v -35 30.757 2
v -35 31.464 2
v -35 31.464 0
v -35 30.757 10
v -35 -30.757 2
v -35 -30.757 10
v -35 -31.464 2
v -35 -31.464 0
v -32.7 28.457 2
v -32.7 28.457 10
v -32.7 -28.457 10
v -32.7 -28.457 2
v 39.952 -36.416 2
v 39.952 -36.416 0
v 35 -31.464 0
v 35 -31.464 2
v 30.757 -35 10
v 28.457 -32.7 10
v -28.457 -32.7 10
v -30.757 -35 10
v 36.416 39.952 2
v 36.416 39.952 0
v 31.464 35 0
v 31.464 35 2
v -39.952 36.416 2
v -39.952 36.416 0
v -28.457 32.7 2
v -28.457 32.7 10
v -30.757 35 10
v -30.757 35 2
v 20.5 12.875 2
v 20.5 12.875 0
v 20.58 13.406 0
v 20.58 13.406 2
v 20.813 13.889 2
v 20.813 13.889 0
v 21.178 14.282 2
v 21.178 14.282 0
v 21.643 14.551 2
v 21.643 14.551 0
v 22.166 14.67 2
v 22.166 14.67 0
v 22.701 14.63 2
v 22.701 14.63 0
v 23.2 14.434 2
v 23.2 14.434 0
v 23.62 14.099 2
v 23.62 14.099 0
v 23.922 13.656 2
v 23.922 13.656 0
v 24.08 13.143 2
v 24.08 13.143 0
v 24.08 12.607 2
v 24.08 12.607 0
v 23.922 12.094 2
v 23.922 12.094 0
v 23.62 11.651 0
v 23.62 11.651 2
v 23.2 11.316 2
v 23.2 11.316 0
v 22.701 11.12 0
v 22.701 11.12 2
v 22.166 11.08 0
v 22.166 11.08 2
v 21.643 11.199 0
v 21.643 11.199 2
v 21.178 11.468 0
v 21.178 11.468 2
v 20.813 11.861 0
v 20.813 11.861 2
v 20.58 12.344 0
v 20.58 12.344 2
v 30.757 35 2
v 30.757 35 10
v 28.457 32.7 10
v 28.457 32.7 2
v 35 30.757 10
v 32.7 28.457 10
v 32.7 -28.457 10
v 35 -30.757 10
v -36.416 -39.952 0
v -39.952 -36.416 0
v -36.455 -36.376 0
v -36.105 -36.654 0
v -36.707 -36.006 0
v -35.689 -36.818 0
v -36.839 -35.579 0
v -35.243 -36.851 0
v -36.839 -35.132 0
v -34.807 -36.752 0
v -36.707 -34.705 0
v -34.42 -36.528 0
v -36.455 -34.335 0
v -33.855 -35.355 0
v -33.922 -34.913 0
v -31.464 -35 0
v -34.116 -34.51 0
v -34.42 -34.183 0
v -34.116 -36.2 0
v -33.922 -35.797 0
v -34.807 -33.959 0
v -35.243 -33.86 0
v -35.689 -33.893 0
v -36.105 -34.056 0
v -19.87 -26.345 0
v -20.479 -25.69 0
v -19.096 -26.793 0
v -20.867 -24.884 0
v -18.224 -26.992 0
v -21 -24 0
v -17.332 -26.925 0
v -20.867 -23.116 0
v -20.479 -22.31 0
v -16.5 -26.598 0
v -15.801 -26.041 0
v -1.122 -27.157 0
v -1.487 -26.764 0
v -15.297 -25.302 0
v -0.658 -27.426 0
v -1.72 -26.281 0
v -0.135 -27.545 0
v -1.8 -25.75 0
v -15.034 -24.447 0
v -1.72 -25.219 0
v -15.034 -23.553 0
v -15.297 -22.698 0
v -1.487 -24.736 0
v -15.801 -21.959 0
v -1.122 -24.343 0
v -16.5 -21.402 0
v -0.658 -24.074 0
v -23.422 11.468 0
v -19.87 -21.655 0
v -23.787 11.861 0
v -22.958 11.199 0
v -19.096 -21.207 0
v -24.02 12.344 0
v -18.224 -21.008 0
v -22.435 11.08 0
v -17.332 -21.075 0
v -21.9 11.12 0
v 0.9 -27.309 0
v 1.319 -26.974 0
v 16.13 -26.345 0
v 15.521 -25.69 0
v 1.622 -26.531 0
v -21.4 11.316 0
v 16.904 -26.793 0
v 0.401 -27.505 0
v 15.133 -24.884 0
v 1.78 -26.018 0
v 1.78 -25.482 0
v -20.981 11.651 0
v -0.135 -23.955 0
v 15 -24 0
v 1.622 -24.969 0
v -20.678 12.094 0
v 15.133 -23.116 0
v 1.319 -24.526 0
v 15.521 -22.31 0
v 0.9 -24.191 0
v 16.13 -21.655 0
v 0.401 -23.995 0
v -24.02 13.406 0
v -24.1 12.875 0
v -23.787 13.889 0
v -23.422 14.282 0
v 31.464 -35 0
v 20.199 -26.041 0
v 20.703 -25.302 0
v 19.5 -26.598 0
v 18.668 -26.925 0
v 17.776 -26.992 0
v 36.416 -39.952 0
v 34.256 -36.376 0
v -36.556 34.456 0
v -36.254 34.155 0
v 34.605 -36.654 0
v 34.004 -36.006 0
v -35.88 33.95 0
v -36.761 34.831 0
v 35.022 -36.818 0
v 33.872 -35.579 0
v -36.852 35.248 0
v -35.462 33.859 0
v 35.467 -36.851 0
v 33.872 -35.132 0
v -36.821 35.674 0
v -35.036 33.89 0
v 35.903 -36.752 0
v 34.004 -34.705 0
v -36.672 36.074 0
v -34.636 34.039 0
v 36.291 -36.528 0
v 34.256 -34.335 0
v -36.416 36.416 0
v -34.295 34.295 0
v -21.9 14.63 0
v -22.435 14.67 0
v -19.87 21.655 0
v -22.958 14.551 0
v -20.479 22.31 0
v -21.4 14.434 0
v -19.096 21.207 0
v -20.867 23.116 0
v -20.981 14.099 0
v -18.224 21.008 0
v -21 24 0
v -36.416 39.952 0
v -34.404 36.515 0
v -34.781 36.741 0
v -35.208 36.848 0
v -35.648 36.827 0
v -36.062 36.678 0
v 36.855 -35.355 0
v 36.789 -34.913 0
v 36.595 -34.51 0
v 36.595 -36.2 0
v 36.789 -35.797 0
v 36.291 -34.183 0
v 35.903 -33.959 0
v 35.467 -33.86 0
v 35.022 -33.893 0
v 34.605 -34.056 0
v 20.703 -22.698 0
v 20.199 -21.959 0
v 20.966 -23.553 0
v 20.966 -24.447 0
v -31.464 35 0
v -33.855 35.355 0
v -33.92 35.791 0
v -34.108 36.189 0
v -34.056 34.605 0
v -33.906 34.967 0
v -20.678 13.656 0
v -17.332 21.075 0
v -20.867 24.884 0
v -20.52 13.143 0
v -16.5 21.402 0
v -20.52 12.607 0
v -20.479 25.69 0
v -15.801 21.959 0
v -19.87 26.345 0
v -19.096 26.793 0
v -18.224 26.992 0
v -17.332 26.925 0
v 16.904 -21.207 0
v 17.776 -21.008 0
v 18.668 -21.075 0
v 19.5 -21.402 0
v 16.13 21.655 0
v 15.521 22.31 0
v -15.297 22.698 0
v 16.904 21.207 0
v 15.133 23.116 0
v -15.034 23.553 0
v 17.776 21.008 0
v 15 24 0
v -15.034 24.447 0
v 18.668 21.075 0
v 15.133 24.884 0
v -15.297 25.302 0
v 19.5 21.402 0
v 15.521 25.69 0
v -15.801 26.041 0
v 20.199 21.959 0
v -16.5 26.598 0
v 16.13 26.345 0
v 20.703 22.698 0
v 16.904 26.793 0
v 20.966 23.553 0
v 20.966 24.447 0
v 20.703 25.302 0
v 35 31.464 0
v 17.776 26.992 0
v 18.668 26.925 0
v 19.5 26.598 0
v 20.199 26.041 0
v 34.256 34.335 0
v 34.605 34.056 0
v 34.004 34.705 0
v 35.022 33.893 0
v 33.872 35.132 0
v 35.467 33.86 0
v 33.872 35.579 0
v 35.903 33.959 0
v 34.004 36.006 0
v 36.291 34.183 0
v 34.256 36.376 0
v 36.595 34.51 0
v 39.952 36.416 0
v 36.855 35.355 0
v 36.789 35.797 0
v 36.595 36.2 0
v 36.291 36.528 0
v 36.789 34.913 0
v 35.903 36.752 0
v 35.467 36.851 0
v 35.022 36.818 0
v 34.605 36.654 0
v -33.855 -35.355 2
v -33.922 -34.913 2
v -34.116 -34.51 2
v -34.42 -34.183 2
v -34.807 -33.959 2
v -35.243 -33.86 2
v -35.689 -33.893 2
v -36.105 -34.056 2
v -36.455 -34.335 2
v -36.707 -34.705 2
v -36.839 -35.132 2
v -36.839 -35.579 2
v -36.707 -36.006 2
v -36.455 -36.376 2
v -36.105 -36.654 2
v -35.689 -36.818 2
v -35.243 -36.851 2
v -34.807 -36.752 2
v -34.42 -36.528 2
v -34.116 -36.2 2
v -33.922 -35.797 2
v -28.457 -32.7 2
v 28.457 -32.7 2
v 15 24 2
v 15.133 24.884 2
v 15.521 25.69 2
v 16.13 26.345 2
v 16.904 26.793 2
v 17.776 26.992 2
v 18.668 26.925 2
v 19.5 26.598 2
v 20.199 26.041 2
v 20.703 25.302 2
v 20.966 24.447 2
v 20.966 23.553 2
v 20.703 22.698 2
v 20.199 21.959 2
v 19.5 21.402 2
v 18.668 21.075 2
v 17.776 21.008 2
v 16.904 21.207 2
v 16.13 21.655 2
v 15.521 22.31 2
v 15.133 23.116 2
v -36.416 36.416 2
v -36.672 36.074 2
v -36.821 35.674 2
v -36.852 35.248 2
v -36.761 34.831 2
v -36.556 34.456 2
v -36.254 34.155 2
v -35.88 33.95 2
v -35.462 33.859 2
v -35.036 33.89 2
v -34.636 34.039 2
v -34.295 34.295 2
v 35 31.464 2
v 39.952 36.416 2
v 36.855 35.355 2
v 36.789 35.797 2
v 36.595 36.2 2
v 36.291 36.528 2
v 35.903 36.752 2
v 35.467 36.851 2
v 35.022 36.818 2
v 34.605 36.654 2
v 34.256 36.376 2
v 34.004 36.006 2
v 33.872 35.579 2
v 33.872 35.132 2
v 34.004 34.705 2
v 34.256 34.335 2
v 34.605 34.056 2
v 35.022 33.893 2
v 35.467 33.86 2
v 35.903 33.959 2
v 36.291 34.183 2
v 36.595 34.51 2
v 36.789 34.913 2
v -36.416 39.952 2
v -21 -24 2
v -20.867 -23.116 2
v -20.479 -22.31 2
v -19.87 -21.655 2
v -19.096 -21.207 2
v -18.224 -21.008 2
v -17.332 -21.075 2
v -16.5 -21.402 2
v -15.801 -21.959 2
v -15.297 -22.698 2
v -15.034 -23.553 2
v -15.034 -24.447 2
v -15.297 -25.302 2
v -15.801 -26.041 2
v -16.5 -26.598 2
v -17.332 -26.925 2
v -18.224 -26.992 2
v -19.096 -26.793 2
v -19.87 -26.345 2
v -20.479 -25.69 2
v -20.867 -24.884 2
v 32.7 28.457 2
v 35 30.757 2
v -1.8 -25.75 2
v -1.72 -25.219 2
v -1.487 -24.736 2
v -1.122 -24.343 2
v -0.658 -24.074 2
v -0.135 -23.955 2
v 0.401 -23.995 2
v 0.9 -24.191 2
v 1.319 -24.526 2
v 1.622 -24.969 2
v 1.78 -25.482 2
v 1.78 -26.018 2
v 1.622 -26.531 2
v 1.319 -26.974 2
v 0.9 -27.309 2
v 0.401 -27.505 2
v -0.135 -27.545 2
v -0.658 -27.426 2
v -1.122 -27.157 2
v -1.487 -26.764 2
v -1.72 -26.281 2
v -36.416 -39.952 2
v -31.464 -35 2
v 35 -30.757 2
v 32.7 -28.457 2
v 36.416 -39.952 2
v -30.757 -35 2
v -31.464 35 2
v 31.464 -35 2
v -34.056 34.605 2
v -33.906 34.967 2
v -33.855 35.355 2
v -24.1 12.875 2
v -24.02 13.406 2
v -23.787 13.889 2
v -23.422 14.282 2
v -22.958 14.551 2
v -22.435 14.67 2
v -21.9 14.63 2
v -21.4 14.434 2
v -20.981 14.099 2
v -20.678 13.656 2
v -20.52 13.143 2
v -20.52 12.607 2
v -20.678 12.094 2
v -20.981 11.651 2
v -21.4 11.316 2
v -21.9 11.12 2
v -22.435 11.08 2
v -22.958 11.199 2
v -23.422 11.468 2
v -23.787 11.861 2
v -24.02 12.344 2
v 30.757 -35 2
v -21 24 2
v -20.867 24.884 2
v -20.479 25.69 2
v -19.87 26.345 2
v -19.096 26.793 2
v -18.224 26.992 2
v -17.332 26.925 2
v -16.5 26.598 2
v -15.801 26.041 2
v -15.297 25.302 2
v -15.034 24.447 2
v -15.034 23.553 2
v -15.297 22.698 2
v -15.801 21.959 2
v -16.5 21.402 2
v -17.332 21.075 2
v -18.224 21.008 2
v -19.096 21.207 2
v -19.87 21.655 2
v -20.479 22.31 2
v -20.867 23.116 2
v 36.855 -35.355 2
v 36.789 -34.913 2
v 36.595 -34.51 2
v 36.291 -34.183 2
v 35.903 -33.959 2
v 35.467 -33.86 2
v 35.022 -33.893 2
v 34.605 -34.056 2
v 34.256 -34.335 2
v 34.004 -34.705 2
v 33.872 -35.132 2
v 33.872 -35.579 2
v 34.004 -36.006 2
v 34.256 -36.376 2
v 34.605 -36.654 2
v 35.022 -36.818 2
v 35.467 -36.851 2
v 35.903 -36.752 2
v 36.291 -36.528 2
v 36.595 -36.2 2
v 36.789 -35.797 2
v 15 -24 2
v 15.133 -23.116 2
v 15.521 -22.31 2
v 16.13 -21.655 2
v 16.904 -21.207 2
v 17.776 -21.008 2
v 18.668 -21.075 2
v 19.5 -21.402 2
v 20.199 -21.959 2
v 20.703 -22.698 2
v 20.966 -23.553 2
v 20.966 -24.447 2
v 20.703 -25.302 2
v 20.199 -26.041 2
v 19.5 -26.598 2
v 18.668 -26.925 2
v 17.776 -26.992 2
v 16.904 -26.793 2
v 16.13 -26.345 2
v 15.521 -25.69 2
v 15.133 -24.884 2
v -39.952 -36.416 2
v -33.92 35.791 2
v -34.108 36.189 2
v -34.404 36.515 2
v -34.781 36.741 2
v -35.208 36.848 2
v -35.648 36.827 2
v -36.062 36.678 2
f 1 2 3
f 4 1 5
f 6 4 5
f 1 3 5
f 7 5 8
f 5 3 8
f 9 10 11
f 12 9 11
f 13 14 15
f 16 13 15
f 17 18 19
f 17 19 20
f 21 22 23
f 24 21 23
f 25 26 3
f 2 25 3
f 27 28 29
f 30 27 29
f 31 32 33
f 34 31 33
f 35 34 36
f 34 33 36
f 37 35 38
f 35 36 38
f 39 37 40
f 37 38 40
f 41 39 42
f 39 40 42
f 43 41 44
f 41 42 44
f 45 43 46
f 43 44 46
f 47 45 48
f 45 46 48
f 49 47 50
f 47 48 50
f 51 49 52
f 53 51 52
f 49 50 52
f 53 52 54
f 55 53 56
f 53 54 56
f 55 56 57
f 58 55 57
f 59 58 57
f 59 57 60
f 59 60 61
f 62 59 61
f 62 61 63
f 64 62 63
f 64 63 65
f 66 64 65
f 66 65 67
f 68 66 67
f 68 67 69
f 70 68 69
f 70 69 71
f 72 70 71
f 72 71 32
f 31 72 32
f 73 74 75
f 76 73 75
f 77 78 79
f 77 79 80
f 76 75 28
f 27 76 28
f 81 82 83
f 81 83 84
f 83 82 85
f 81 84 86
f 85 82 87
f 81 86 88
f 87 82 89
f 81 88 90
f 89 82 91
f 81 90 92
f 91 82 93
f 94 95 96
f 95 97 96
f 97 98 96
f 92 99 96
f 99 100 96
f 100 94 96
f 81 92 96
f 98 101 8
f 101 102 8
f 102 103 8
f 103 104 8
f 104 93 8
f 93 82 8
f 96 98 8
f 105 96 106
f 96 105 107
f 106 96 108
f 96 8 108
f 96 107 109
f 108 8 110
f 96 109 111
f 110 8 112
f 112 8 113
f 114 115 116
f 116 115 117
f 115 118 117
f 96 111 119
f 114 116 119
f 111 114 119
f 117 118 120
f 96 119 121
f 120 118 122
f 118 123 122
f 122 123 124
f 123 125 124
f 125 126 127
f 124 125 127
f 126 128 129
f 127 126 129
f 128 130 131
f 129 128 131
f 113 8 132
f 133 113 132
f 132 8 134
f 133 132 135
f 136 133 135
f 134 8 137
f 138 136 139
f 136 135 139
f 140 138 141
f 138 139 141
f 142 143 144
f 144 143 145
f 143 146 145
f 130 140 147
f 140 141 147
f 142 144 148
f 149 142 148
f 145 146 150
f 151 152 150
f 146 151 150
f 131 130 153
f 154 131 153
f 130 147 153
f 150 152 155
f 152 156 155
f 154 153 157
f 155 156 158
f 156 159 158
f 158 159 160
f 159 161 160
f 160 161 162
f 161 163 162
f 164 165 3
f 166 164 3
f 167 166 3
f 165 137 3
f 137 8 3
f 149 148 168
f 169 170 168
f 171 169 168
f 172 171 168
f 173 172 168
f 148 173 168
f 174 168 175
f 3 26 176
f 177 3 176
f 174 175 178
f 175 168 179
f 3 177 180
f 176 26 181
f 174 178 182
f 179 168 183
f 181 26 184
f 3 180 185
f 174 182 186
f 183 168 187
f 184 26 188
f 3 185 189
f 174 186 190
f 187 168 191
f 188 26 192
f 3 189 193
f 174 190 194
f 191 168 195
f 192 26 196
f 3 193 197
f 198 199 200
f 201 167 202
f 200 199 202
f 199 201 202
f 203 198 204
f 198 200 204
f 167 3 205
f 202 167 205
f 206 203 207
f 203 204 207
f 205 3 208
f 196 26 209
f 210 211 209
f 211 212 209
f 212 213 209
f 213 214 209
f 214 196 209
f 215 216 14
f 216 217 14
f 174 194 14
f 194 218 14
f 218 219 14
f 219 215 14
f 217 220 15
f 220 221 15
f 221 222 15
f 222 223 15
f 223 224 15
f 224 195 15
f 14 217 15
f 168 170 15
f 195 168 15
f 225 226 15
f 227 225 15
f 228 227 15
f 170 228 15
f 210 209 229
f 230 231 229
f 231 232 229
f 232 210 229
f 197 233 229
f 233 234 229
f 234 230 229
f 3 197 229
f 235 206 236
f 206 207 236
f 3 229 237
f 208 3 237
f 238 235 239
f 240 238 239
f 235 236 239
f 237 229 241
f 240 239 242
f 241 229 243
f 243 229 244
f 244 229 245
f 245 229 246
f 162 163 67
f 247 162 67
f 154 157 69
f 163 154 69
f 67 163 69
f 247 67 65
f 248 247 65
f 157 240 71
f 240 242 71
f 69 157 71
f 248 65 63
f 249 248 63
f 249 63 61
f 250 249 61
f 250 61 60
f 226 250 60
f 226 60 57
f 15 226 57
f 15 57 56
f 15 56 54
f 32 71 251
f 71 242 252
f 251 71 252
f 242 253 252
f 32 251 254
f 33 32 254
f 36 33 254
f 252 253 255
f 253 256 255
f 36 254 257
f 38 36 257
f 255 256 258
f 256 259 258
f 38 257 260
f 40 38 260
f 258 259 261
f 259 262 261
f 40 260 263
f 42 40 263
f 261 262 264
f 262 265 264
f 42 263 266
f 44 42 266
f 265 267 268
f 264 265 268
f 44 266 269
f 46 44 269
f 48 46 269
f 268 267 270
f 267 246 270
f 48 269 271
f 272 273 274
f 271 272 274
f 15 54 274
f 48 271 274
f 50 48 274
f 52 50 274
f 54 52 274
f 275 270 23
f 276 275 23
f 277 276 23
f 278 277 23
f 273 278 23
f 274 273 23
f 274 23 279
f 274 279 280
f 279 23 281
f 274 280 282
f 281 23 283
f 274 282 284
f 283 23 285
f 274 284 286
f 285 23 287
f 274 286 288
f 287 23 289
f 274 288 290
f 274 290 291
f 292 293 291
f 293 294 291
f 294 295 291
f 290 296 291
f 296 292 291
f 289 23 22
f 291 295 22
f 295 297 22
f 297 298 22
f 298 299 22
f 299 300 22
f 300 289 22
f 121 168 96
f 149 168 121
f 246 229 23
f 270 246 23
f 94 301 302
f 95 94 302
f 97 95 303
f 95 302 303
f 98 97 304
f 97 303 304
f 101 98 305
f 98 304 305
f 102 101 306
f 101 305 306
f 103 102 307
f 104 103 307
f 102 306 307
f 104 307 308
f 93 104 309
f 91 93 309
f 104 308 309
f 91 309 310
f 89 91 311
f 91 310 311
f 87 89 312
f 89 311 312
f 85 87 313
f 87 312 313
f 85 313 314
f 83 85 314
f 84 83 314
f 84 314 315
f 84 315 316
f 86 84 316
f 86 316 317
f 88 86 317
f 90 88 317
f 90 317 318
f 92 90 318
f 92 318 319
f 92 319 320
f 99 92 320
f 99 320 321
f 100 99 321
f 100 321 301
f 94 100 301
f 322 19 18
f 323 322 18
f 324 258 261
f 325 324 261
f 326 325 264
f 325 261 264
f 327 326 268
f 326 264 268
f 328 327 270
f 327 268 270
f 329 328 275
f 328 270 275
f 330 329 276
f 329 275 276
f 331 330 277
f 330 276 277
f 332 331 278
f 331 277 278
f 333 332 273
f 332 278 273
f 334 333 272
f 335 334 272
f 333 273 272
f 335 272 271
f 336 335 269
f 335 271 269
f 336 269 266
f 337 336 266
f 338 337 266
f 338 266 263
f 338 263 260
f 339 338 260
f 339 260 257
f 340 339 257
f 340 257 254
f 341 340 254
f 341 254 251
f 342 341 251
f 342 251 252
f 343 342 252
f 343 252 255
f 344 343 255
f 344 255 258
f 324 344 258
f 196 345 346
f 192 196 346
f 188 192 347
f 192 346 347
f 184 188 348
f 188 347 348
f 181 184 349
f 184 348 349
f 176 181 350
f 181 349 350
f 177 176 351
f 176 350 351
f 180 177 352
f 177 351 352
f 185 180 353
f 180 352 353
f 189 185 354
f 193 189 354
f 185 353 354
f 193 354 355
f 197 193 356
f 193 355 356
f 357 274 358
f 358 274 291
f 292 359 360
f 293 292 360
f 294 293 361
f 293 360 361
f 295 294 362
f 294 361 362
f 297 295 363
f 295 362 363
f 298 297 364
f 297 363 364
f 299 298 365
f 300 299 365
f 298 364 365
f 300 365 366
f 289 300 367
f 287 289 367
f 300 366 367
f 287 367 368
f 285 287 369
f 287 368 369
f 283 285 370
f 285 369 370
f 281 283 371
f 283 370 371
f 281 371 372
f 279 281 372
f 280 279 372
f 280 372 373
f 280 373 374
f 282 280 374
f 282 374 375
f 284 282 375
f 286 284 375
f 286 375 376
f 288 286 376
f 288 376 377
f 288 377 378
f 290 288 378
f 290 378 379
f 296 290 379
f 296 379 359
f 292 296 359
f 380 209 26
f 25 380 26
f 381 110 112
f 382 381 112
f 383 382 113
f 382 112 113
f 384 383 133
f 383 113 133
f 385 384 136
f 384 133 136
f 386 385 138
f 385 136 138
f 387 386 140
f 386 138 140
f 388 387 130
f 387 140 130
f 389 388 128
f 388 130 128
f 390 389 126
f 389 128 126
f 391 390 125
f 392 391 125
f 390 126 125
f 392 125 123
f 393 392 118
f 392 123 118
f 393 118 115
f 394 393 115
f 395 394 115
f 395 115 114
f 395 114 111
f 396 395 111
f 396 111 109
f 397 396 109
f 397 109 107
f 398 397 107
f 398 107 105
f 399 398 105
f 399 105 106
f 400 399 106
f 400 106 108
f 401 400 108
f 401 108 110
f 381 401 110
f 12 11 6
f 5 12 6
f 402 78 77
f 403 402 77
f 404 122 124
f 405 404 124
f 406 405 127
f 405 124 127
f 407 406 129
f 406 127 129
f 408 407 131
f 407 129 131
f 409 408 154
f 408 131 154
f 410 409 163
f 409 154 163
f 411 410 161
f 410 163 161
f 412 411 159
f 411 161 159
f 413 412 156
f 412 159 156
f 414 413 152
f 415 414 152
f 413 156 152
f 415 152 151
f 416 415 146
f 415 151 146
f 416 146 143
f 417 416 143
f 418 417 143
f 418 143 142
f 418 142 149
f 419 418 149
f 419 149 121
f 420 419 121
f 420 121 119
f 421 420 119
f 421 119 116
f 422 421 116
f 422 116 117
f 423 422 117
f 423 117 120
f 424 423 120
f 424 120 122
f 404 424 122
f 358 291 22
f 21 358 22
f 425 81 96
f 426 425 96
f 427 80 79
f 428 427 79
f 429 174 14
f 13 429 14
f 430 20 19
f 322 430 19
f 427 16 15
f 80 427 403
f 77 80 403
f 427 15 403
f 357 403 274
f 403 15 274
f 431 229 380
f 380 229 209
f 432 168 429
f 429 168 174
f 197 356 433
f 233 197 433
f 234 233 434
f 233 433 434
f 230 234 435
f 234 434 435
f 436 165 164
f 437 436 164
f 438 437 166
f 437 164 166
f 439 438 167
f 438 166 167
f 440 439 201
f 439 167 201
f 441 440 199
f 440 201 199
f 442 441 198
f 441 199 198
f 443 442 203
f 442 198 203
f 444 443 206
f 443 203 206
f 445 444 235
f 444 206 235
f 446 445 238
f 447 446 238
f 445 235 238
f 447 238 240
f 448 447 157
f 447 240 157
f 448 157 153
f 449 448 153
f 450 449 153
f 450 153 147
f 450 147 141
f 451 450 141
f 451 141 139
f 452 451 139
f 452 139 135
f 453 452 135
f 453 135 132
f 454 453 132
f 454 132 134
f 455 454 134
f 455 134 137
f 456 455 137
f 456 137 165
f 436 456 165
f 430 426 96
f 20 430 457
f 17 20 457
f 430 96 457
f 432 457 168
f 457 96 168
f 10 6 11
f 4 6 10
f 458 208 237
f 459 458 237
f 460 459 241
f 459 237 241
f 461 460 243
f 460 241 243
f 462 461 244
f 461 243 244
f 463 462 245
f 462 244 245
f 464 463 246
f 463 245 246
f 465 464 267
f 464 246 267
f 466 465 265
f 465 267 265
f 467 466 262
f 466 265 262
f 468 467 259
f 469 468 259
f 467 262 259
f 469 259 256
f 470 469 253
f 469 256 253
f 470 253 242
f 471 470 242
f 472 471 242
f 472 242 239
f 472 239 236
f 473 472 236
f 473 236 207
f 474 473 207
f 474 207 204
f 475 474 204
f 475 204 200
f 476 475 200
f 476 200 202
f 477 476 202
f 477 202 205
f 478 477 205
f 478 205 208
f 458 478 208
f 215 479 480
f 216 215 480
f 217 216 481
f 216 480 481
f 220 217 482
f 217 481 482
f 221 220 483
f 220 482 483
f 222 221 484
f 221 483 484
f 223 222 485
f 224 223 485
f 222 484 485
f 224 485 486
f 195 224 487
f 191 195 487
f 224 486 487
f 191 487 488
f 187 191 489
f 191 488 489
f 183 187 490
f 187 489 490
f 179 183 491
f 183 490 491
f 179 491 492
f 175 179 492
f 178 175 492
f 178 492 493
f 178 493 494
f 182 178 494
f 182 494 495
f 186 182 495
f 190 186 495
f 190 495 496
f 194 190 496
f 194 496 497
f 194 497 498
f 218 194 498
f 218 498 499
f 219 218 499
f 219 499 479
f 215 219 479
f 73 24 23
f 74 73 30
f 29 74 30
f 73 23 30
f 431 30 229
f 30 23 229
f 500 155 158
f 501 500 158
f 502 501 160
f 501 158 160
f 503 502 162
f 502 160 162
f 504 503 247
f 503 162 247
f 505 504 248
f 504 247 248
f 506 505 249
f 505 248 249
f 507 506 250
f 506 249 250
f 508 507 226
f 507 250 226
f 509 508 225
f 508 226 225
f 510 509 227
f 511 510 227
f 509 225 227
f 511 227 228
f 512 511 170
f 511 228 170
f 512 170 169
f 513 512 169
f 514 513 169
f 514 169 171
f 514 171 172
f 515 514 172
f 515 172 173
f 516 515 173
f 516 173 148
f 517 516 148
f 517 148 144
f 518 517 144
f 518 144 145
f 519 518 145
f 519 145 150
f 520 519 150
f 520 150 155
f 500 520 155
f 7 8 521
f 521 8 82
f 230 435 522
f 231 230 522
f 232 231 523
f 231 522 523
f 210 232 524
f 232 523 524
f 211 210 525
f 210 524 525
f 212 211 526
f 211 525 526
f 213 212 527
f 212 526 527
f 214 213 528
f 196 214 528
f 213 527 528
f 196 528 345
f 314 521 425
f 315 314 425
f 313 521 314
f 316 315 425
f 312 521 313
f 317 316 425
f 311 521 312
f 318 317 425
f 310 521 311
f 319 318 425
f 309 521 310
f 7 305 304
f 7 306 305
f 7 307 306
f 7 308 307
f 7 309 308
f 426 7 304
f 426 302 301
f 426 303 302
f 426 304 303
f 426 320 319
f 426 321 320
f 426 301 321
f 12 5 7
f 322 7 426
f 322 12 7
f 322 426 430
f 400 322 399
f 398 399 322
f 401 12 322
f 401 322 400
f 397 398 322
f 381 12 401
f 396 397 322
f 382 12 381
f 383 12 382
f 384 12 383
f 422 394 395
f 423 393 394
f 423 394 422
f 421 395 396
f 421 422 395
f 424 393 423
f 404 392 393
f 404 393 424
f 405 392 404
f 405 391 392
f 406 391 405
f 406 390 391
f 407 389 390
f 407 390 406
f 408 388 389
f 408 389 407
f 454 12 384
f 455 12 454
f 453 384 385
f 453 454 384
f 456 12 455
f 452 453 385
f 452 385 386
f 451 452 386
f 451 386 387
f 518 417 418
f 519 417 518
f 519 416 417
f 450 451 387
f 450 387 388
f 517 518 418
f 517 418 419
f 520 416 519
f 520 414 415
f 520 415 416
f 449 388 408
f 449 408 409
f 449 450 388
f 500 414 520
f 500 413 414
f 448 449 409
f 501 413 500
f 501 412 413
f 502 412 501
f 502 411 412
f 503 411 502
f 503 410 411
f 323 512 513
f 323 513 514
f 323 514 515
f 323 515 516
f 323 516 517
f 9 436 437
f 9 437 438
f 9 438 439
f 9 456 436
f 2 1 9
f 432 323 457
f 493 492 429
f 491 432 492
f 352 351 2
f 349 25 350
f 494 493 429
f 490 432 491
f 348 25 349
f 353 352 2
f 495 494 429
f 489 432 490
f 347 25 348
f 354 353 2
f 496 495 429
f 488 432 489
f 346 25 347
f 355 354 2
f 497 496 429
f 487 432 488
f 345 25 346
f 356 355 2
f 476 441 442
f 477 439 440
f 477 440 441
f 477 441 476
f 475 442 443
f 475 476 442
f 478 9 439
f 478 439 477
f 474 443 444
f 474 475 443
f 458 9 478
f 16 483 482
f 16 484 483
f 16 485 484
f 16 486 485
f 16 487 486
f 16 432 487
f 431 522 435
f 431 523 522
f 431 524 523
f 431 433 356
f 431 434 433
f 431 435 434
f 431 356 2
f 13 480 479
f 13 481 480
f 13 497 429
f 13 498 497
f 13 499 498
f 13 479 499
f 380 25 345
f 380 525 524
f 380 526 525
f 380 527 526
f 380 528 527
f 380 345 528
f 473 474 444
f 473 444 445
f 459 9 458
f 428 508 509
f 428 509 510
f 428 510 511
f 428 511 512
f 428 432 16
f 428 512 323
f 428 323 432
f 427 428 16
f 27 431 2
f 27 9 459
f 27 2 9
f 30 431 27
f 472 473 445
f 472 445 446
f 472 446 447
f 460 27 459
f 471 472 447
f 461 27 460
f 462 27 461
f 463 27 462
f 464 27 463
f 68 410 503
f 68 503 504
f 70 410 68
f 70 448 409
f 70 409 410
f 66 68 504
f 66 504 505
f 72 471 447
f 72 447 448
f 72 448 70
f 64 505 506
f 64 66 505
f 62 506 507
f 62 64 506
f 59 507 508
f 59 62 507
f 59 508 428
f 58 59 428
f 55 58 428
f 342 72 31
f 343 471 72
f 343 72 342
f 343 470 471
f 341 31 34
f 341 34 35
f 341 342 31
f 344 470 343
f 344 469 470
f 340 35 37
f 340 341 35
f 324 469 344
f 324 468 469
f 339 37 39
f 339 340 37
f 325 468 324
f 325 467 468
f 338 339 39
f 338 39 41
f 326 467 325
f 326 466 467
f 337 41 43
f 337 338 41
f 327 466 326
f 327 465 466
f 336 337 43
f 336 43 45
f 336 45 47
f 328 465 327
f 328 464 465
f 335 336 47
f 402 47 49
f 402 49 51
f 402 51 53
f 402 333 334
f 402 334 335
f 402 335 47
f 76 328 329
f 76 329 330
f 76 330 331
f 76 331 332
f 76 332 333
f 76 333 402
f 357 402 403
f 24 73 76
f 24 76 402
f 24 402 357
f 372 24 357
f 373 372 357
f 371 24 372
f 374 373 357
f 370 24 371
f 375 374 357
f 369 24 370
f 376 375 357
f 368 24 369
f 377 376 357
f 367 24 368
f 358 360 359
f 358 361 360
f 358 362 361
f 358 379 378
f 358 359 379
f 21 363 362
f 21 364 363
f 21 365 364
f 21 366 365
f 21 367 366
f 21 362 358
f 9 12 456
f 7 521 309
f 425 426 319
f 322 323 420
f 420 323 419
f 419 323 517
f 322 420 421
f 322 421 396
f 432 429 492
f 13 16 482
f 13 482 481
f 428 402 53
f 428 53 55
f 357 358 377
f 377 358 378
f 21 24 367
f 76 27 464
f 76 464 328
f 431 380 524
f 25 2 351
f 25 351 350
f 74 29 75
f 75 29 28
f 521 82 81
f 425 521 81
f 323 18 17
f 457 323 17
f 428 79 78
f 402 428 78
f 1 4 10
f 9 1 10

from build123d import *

# Parameters (mm, degrees)
EXTRUDE_1_DEPTH     = 10
CUT_EXTRUDE_1_DEPTH = 8
CUT_EXTRUDE_2_REACH = 52.498
SKETCH_3_R          = 1.8
SKETCH_4_R          = 3
CUT_EXTRUDE_3_DEPTH = 51.497524692
EXTRUDE_START       = -10
EXTRUDE_2_DEPTH     = 10
CUT_EXTRUDE_4_DEPTH = 8
CUT_EXTRUDE_5_REACH = 59.064
SKETCH_7_R          = 1.5


with BuildPart() as part:
    # 草图1 → 凸台-拉伸1 (new body)
    with BuildSketch(Plane.XY):
        with BuildLine():
            Line((-33, -35), (33, -35))
            ThreePointArc((33, -35), (34.414213562, -34.414213562), (35, -33))
            Line((35, -33), (35, 33))
            ThreePointArc((35, 33), (34.414213562, 34.414213562), (33, 35))
            Line((33, 35), (-33, 35))
            ThreePointArc((-33, 35), (-34.414213562, 34.414213562), (-35, 33))
            Line((-35, 33), (-35, -33))
            ThreePointArc((-35, -33), (-34.414213562, -34.414213562), (-33, -35))
        make_face()
    extrude(amount=EXTRUDE_1_DEPTH)

    # 草图2 → 切除-拉伸1 (cut)
    with BuildSketch(Plane.XY.offset(10)):
        with BuildLine():
            Line((-29.7, -32.7), (29.7, -32.7))
            ThreePointArc((29.7, -32.7), (31.821320344, -31.821320344), (32.7, -29.7))
            Line((32.7, -29.7), (32.7, 29.7))
            ThreePointArc((32.7, 29.7), (31.821320344, 31.821320344), (29.7, 32.7))
            Line((29.7, 32.7), (-29.7, 32.7))
            ThreePointArc((-29.7, 32.7), (-31.821320344, 31.821320344), (-32.7, 29.7))
            Line((-32.7, 29.7), (-32.7, -29.7))
            ThreePointArc((-32.7, -29.7), (-31.821320344, -31.821320344), (-29.7, -32.7))
        make_face()
    extrude(amount=-CUT_EXTRUDE_1_DEPTH, mode=Mode.SUBTRACT)

    # 草图3 → 切除-拉伸2 (cut, up to next)
    with BuildSketch(Plane(origin=(0, 0, 0), x_dir=(-1, 0, 0), z_dir=(0, 0, -1)), mode=Mode.PRIVATE) as cut_extrude_2_sk1:
        with Locations((-22.300154147, 12.875)):
            Circle(SKETCH_3_R)
    cut_extrude_2_tool1 = extrude(cut_extrude_2_sk1.sketch, amount=-CUT_EXTRUDE_2_REACH, mode=Mode.PRIVATE) & part.part
    # 草图3 → 切除-拉伸2 (cut, up to next)
    with BuildSketch(Plane(origin=(0, 0, 0), x_dir=(-1, 0, 0), z_dir=(0, 0, -1)), mode=Mode.PRIVATE) as cut_extrude_2_sk2:
        with Locations((22.300154147, 12.875)):
            Circle(SKETCH_3_R)
    cut_extrude_2_tool2 = extrude(cut_extrude_2_sk2.sketch, amount=-CUT_EXTRUDE_2_REACH, mode=Mode.PRIVATE) & part.part
    # 草图3 → 切除-拉伸2 (cut, up to next)
    with BuildSketch(Plane(origin=(0, 0, 0), x_dir=(-1, 0, 0), z_dir=(0, 0, -1)), mode=Mode.PRIVATE) as cut_extrude_2_sk3:
        with Locations((0, -25.75)):
            Circle(SKETCH_3_R)
    cut_extrude_2_tool3 = extrude(cut_extrude_2_sk3.sketch, amount=-CUT_EXTRUDE_2_REACH, mode=Mode.PRIVATE) & part.part
    add(cut_extrude_2_tool1.solids().sort_by_distance((22.300154, 12.875, 0))[0], mode=Mode.SUBTRACT)
    add(cut_extrude_2_tool2.solids().sort_by_distance((-22.300154, 12.875, 0))[0], mode=Mode.SUBTRACT)
    add(cut_extrude_2_tool3.solids().sort_by_distance((0, -25.75, 0))[0], mode=Mode.SUBTRACT)

    # 草图4 → 切除-拉伸3 (cut, through all)
    with BuildSketch(Plane(origin=(0, 0, 0), x_dir=(-1, 0, 0), z_dir=(0, 0, -1))):
        with Locations((-18, 24)):
            Circle(SKETCH_4_R)
        with Locations((18, 24)):
            Circle(SKETCH_4_R)
        with Locations((-18, -24)):
            Circle(SKETCH_4_R)
        with Locations((18, -24)):
            Circle(SKETCH_4_R)
    extrude(amount=-CUT_EXTRUDE_3_DEPTH, mode=Mode.SUBTRACT)

    # 草图5 → 凸台-拉伸2 (add)
    with BuildSketch(Plane.XY.offset(10).offset(EXTRUDE_START)):
        with BuildLine():
            Line((-29.164466094, 32.7), (-31.464466094, 35))
            Line((-31.464466094, 35), (-33, 35))
            ThreePointArc((-33, 35), (-34.414213562, 34.414213562), (-35, 33))
            Line((-35, 33), (-35, 31.464466094))
            Line((-35, 31.464466094), (-32.7, 29.164466094))
            Line((-32.7, 29.164466094), (-32.7, 29.7))
            ThreePointArc((-32.7, 29.7), (-31.821320344, 31.821320344), (-29.7, 32.7))
            Line((-29.7, 32.7), (-29.164466094, 32.7))
        make_face()
        with BuildLine():
            Line((-33, 35), (-31.464466094, 35))
            Line((-31.464466094, 35), (-32.646446609, 36.181980515))
            Line((-32.646446609, 36.181980515), (-36.415999231, 39.951533137))
            Line((-36.415999231, 39.951533137), (-39.951533137, 36.415999231))
            Line((-39.951533137, 36.415999231), (-36.181980515, 32.646446609))
            Line((-36.181980515, 32.646446609), (-35, 31.464466094))
            Line((-35, 31.464466094), (-35, 33))
            ThreePointArc((-35, 33), (-34.414213562, 34.414213562), (-33, 35))
        make_face()
        with BuildLine():
            ThreePointArc((35, 33), (34.414213562, 34.414213562), (33, 35))
            Line((33, 35), (31.464466094, 35))
            Line((31.464466094, 35), (29.164466094, 32.7))
            Line((29.164466094, 32.7), (29.7, 32.7))
            ThreePointArc((29.7, 32.7), (31.821320344, 31.821320344), (32.7, 29.7))
            Line((32.7, 29.7), (32.7, 29.164466094))
            Line((32.7, 29.164466094), (35, 31.464466094))
            Line((35, 31.464466094), (35, 33))
        make_face()
        with BuildLine():
            Line((31.464466094, 35), (33, 35))
            ThreePointArc((33, 35), (34.414213562, 34.414213562), (35, 33))
            Line((35, 33), (35, 31.464466094))
            Line((35, 31.464466094), (36.181980515, 32.646446609))
            Line((36.181980515, 32.646446609), (39.951533137, 36.415999231))
            Line((39.951533137, 36.415999231), (36.415999231, 39.951533137))
            Line((36.415999231, 39.951533137), (32.646446609, 36.181980515))
            Line((32.646446609, 36.181980515), (31.464466094, 35))
        make_face()
        with BuildLine():
            Line((36.181980515, -32.646446609), (35, -31.464466094))
            Line((35, -31.464466094), (35, -33))
            ThreePointArc((35, -33), (34.414213562, -34.414213562), (33, -35))
            Line((33, -35), (31.464466094, -35))
            Line((31.464466094, -35), (32.646446609, -36.181980515))
            Line((32.646446609, -36.181980515), (36.415999231, -39.951533137))
            Line((36.415999231, -39.951533137), (39.951533137, -36.415999231))
            Line((39.951533137, -36.415999231), (36.181980515, -32.646446609))
        make_face()
        with BuildLine():
            Line((35, -33), (35, -31.464466094))
            Line((35, -31.464466094), (32.7, -29.164466094))
            Line((32.7, -29.164466094), (32.7, -29.7))
            ThreePointArc((32.7, -29.7), (31.821320344, -31.821320344), (29.7, -32.7))
            Line((29.7, -32.7), (29.164466094, -32.7))
            Line((29.164466094, -32.7), (31.464466094, -35))
            Line((31.464466094, -35), (33, -35))
            ThreePointArc((33, -35), (34.414213562, -34.414213562), (35, -33))
        make_face()
        with BuildLine():
            Line((-35, -33), (-35, -31.464466094))
            Line((-35, -31.464466094), (-36.181980515, -32.646446609))
            Line((-36.181980515, -32.646446609), (-39.951533137, -36.415999231))
            Line((-39.951533137, -36.415999231), (-36.415999231, -39.951533137))
            Line((-36.415999231, -39.951533137), (-32.646446609, -36.181980515))
            Line((-32.646446609, -36.181980515), (-31.464466094, -35))
            Line((-31.464466094, -35), (-33, -35))
            ThreePointArc((-33, -35), (-34.414213562, -34.414213562), (-35, -33))
        make_face()
        with BuildLine():
            Line((-32.7, -29.164466094), (-35, -31.464466094))
            Line((-35, -31.464466094), (-35, -33))
            ThreePointArc((-35, -33), (-34.414213562, -34.414213562), (-33, -35))
            Line((-33, -35), (-31.464466094, -35))
            Line((-31.464466094, -35), (-29.164466094, -32.7))
            Line((-29.164466094, -32.7), (-29.7, -32.7))
            ThreePointArc((-29.7, -32.7), (-31.821320344, -31.821320344), (-32.7, -29.7))
            Line((-32.7, -29.7), (-32.7, -29.164466094))
        make_face()
    extrude(amount=EXTRUDE_2_DEPTH)

    # 草图6 → 切除-拉伸4 (cut)
    with BuildSketch(Plane.XY.offset(10)):
        with BuildLine():
            Line((-30.757359313, -35), (-28.457359313, -32.7))
            Line((-28.457359313, -32.7), (-29.7, -32.7))
            ThreePointArc((-29.7, -32.7), (-31.821320344, -31.821320344), (-32.7, -29.7))
            Line((-32.7, -29.7), (-32.7, -28.457359313))
            Line((-32.7, -28.457359313), (-35, -30.757359313))
            Line((-35, -30.757359313), (-35, -31.464466094))
            Line((-35, -31.464466094), (-39.951533137, -36.415999231))
            Line((-39.951533137, -36.415999231), (-36.415999231, -39.951533137))
            Line((-36.415999231, -39.951533137), (-31.464466094, -35))
            Line((-31.464466094, -35), (-30.757359313, -35))
        make_face()
        with BuildLine():
            Line((-28.457359313, -32.7), (-28.257359313, -32.5))
            Line((-28.257359313, -32.5), (-27.64321207, -31.885852757))
            Line((-27.64321207, -31.885852757), (-31.885852757, -27.64321207))
            Line((-31.885852757, -27.64321207), (-32.5, -28.257359313))
            Line((-32.5, -28.257359313), (-32.7, -28.457359313))
            Line((-32.7, -28.457359313), (-32.7, -29.7))
            ThreePointArc((-32.7, -29.7), (-31.821320344, -31.821320344), (-29.7, -32.7))
            Line((-29.7, -32.7), (-28.457359313, -32.7))
        make_face()
        with BuildLine():
            Line((29.7, -32.7), (28.457359313, -32.7))
            Line((28.457359313, -32.7), (30.757359313, -35))
            Line((30.757359313, -35), (31.464466094, -35))
            Line((31.464466094, -35), (36.415999231, -39.951533137))
            Line((36.415999231, -39.951533137), (39.951533137, -36.415999231))
            Line((39.951533137, -36.415999231), (35, -31.464466094))
            Line((35, -31.464466094), (35, -30.757359313))
            Line((35, -30.757359313), (32.7, -28.457359313))
            Line((32.7, -28.457359313), (32.7, -29.7))
            ThreePointArc((32.7, -29.7), (31.821320344, -31.821320344), (29.7, -32.7))
        make_face()
        with BuildLine():
            Line((27.64321207, -31.885852757), (28.257359313, -32.5))
            Line((28.257359313, -32.5), (28.457359313, -32.7))
            Line((28.457359313, -32.7), (29.7, -32.7))
            ThreePointArc((29.7, -32.7), (31.821320344, -31.821320344), (32.7, -29.7))
            Line((32.7, -29.7), (32.7, -28.457359313))
            Line((32.7, -28.457359313), (32.5, -28.257359313))
            Line((32.5, -28.257359313), (31.885852757, -27.64321207))
            Line((31.885852757, -27.64321207), (27.64321207, -31.885852757))
        make_face()
        with BuildLine():
            Line((32.7, 29.7), (32.7, 28.457359313))
            Line((32.7, 28.457359313), (35, 30.757359313))
            Line((35, 30.757359313), (35, 31.464466094))
            Line((35, 31.464466094), (39.951533137, 36.415999231))
            Line((39.951533137, 36.415999231), (36.415999231, 39.951533137))
            Line((36.415999231, 39.951533137), (31.464466094, 35))
            Line((31.464466094, 35), (30.757359313, 35))
            Line((30.757359313, 35), (28.457359313, 32.7))
            Line((28.457359313, 32.7), (29.7, 32.7))
            ThreePointArc((29.7, 32.7), (31.821320344, 31.821320344), (32.7, 29.7))
        make_face()
        with BuildLine():
            Line((31.885852757, 27.64321207), (32.5, 28.257359313))
            Line((32.5, 28.257359313), (32.7, 28.457359313))
            Line((32.7, 28.457359313), (32.7, 29.7))
            ThreePointArc((32.7, 29.7), (31.821320344, 31.821320344), (29.7, 32.7))
            Line((29.7, 32.7), (28.457359313, 32.7))
            Line((28.457359313, 32.7), (28.257359313, 32.5))
            Line((28.257359313, 32.5), (27.64321207, 31.885852757))
            Line((27.64321207, 31.885852757), (31.885852757, 27.64321207))
        make_face()
        with BuildLine():
            Line((-32.7, 28.457359313), (-32.5, 28.257359313))
            Line((-32.5, 28.257359313), (-31.885852757, 27.64321207))
            Line((-31.885852757, 27.64321207), (-27.64321207, 31.885852757))
            Line((-27.64321207, 31.885852757), (-28.257359313, 32.5))
            Line((-28.257359313, 32.5), (-28.457359313, 32.7))
            Line((-28.457359313, 32.7), (-29.7, 32.7))
            ThreePointArc((-29.7, 32.7), (-31.821320344, 31.821320344), (-32.7, 29.7))
            Line((-32.7, 29.7), (-32.7, 28.457359313))
        make_face()
        with BuildLine():
            Line((-35, 30.757359313), (-32.7, 28.457359313))
            Line((-32.7, 28.457359313), (-32.7, 29.7))
            ThreePointArc((-32.7, 29.7), (-31.821320344, 31.821320344), (-29.7, 32.7))
            Line((-29.7, 32.7), (-28.457359313, 32.7))
            Line((-28.457359313, 32.7), (-30.757359313, 35))
            Line((-30.757359313, 35), (-31.464466094, 35))
            Line((-31.464466094, 35), (-36.415999231, 39.951533137))
            Line((-36.415999231, 39.951533137), (-39.951533137, 36.415999231))
            Line((-39.951533137, 36.415999231), (-35, 31.464466094))
            Line((-35, 31.464466094), (-35, 30.757359313))
        make_face()
    extrude(amount=-CUT_EXTRUDE_4_DEPTH, mode=Mode.SUBTRACT)

    # 草图7 → 切除-拉伸5 (cut, up to next)
    with BuildSketch(Plane.XY.offset(2), mode=Mode.PRIVATE) as cut_extrude_5_sk1:
        with BuildLine():
            ThreePointArc((-36.415999231, 36.415999231), (-36.415999231, 34.294678888), (-34.294678888, 34.294678888))
            Line((-34.294678888, 34.294678888), (-36.415999231, 36.415999231))
        make_face()
    cut_extrude_5_tool1 = extrude(cut_extrude_5_sk1.sketch, amount=-CUT_EXTRUDE_5_REACH, mode=Mode.PRIVATE) & part.part
    # 草图7 → 切除-拉伸5 (cut, up to next)
    with BuildSketch(Plane.XY.offset(2), mode=Mode.PRIVATE) as cut_extrude_5_sk2:
        with BuildLine():
            Line((-36.415999231, 36.415999231), (-34.294678888, 34.294678888))
            ThreePointArc((-34.294678888, 34.294678888), (-33.969519761, 34.781313911), (-33.855339059, 35.355339059))
            ThreePointArc((-33.855339059, 35.355339059), (-34.781313911, 36.741158358), (-36.415999231, 36.415999231))
        make_face()
    cut_extrude_5_tool2 = extrude(cut_extrude_5_sk2.sketch, amount=-CUT_EXTRUDE_5_REACH, mode=Mode.PRIVATE) & part.part
    # 草图7 → 切除-拉伸5 (cut, up to next)
    with BuildSketch(Plane.XY.offset(2), mode=Mode.PRIVATE) as cut_extrude_5_sk3:
        with BuildLine():
            ThreePointArc((-36.415999231, 36.415999231), (-36.415999231, 34.294678888), (-34.294678888, 34.294678888))
            Line((-34.294678888, 34.294678888), (-36.415999231, 36.415999231))
        make_face()
    cut_extrude_5_tool3 = extrude(cut_extrude_5_sk3.sketch, amount=-CUT_EXTRUDE_5_REACH, mode=Mode.PRIVATE) & part.part
    # 草图7 → 切除-拉伸5 (cut, up to next)
    with BuildSketch(Plane.XY.offset(2), mode=Mode.PRIVATE) as cut_extrude_5_sk4:
        with BuildLine():
            Line((-36.415999231, 36.415999231), (-34.294678888, 34.294678888))
            ThreePointArc((-34.294678888, 34.294678888), (-33.969519761, 34.781313911), (-33.855339059, 35.355339059))
            ThreePointArc((-33.855339059, 35.355339059), (-34.781313911, 36.741158358), (-36.415999231, 36.415999231))
        make_face()
    cut_extrude_5_tool4 = extrude(cut_extrude_5_sk4.sketch, amount=-CUT_EXTRUDE_5_REACH, mode=Mode.PRIVATE) & part.part
    # 草图7 → 切除-拉伸5 (cut, up to next)
    with BuildSketch(Plane.XY.offset(2), mode=Mode.PRIVATE) as cut_extrude_5_sk5:
        with Locations((35.355339059, 35.355339059)):
            Circle(SKETCH_7_R)
    cut_extrude_5_tool5 = extrude(cut_extrude_5_sk5.sketch, amount=-CUT_EXTRUDE_5_REACH, mode=Mode.PRIVATE) & part.part
    # 草图7 → 切除-拉伸5 (cut, up to next)
    with BuildSketch(Plane.XY.offset(2), mode=Mode.PRIVATE) as cut_extrude_5_sk6:
        with Locations((35.355339059, -35.355339059)):
            Circle(SKETCH_7_R)
    cut_extrude_5_tool6 = extrude(cut_extrude_5_sk6.sketch, amount=-CUT_EXTRUDE_5_REACH, mode=Mode.PRIVATE) & part.part
    # 草图7 → 切除-拉伸5 (cut, up to next)
    with BuildSketch(Plane.XY.offset(2), mode=Mode.PRIVATE) as cut_extrude_5_sk7:
        with Locations((-35.355339059, -35.355339059)):
            Circle(SKETCH_7_R)
    cut_extrude_5_tool7 = extrude(cut_extrude_5_sk7.sketch, amount=-CUT_EXTRUDE_5_REACH, mode=Mode.PRIVATE) & part.part
    add(cut_extrude_5_tool1.solids().sort_by_distance((-35.805497, 34.905181, 2))[0], mode=Mode.SUBTRACT)
    add(cut_extrude_5_tool2.solids().sort_by_distance((-34.905181, 35.805497, 2))[0], mode=Mode.SUBTRACT)
    add(cut_extrude_5_tool3.solids().sort_by_distance((-35.805497, 34.905181, 2))[0], mode=Mode.SUBTRACT)
    add(cut_extrude_5_tool4.solids().sort_by_distance((-34.905181, 35.805497, 2))[0], mode=Mode.SUBTRACT)
    add(cut_extrude_5_tool5.solids().sort_by_distance((35.355339, 35.355339, 2))[0], mode=Mode.SUBTRACT)
    add(cut_extrude_5_tool6.solids().sort_by_distance((35.355339, -35.355339, 2))[0], mode=Mode.SUBTRACT)
    add(cut_extrude_5_tool7.solids().sort_by_distance((-35.355339, -35.355339, 2))[0], mode=Mode.SUBTRACT)


solid = part.part
